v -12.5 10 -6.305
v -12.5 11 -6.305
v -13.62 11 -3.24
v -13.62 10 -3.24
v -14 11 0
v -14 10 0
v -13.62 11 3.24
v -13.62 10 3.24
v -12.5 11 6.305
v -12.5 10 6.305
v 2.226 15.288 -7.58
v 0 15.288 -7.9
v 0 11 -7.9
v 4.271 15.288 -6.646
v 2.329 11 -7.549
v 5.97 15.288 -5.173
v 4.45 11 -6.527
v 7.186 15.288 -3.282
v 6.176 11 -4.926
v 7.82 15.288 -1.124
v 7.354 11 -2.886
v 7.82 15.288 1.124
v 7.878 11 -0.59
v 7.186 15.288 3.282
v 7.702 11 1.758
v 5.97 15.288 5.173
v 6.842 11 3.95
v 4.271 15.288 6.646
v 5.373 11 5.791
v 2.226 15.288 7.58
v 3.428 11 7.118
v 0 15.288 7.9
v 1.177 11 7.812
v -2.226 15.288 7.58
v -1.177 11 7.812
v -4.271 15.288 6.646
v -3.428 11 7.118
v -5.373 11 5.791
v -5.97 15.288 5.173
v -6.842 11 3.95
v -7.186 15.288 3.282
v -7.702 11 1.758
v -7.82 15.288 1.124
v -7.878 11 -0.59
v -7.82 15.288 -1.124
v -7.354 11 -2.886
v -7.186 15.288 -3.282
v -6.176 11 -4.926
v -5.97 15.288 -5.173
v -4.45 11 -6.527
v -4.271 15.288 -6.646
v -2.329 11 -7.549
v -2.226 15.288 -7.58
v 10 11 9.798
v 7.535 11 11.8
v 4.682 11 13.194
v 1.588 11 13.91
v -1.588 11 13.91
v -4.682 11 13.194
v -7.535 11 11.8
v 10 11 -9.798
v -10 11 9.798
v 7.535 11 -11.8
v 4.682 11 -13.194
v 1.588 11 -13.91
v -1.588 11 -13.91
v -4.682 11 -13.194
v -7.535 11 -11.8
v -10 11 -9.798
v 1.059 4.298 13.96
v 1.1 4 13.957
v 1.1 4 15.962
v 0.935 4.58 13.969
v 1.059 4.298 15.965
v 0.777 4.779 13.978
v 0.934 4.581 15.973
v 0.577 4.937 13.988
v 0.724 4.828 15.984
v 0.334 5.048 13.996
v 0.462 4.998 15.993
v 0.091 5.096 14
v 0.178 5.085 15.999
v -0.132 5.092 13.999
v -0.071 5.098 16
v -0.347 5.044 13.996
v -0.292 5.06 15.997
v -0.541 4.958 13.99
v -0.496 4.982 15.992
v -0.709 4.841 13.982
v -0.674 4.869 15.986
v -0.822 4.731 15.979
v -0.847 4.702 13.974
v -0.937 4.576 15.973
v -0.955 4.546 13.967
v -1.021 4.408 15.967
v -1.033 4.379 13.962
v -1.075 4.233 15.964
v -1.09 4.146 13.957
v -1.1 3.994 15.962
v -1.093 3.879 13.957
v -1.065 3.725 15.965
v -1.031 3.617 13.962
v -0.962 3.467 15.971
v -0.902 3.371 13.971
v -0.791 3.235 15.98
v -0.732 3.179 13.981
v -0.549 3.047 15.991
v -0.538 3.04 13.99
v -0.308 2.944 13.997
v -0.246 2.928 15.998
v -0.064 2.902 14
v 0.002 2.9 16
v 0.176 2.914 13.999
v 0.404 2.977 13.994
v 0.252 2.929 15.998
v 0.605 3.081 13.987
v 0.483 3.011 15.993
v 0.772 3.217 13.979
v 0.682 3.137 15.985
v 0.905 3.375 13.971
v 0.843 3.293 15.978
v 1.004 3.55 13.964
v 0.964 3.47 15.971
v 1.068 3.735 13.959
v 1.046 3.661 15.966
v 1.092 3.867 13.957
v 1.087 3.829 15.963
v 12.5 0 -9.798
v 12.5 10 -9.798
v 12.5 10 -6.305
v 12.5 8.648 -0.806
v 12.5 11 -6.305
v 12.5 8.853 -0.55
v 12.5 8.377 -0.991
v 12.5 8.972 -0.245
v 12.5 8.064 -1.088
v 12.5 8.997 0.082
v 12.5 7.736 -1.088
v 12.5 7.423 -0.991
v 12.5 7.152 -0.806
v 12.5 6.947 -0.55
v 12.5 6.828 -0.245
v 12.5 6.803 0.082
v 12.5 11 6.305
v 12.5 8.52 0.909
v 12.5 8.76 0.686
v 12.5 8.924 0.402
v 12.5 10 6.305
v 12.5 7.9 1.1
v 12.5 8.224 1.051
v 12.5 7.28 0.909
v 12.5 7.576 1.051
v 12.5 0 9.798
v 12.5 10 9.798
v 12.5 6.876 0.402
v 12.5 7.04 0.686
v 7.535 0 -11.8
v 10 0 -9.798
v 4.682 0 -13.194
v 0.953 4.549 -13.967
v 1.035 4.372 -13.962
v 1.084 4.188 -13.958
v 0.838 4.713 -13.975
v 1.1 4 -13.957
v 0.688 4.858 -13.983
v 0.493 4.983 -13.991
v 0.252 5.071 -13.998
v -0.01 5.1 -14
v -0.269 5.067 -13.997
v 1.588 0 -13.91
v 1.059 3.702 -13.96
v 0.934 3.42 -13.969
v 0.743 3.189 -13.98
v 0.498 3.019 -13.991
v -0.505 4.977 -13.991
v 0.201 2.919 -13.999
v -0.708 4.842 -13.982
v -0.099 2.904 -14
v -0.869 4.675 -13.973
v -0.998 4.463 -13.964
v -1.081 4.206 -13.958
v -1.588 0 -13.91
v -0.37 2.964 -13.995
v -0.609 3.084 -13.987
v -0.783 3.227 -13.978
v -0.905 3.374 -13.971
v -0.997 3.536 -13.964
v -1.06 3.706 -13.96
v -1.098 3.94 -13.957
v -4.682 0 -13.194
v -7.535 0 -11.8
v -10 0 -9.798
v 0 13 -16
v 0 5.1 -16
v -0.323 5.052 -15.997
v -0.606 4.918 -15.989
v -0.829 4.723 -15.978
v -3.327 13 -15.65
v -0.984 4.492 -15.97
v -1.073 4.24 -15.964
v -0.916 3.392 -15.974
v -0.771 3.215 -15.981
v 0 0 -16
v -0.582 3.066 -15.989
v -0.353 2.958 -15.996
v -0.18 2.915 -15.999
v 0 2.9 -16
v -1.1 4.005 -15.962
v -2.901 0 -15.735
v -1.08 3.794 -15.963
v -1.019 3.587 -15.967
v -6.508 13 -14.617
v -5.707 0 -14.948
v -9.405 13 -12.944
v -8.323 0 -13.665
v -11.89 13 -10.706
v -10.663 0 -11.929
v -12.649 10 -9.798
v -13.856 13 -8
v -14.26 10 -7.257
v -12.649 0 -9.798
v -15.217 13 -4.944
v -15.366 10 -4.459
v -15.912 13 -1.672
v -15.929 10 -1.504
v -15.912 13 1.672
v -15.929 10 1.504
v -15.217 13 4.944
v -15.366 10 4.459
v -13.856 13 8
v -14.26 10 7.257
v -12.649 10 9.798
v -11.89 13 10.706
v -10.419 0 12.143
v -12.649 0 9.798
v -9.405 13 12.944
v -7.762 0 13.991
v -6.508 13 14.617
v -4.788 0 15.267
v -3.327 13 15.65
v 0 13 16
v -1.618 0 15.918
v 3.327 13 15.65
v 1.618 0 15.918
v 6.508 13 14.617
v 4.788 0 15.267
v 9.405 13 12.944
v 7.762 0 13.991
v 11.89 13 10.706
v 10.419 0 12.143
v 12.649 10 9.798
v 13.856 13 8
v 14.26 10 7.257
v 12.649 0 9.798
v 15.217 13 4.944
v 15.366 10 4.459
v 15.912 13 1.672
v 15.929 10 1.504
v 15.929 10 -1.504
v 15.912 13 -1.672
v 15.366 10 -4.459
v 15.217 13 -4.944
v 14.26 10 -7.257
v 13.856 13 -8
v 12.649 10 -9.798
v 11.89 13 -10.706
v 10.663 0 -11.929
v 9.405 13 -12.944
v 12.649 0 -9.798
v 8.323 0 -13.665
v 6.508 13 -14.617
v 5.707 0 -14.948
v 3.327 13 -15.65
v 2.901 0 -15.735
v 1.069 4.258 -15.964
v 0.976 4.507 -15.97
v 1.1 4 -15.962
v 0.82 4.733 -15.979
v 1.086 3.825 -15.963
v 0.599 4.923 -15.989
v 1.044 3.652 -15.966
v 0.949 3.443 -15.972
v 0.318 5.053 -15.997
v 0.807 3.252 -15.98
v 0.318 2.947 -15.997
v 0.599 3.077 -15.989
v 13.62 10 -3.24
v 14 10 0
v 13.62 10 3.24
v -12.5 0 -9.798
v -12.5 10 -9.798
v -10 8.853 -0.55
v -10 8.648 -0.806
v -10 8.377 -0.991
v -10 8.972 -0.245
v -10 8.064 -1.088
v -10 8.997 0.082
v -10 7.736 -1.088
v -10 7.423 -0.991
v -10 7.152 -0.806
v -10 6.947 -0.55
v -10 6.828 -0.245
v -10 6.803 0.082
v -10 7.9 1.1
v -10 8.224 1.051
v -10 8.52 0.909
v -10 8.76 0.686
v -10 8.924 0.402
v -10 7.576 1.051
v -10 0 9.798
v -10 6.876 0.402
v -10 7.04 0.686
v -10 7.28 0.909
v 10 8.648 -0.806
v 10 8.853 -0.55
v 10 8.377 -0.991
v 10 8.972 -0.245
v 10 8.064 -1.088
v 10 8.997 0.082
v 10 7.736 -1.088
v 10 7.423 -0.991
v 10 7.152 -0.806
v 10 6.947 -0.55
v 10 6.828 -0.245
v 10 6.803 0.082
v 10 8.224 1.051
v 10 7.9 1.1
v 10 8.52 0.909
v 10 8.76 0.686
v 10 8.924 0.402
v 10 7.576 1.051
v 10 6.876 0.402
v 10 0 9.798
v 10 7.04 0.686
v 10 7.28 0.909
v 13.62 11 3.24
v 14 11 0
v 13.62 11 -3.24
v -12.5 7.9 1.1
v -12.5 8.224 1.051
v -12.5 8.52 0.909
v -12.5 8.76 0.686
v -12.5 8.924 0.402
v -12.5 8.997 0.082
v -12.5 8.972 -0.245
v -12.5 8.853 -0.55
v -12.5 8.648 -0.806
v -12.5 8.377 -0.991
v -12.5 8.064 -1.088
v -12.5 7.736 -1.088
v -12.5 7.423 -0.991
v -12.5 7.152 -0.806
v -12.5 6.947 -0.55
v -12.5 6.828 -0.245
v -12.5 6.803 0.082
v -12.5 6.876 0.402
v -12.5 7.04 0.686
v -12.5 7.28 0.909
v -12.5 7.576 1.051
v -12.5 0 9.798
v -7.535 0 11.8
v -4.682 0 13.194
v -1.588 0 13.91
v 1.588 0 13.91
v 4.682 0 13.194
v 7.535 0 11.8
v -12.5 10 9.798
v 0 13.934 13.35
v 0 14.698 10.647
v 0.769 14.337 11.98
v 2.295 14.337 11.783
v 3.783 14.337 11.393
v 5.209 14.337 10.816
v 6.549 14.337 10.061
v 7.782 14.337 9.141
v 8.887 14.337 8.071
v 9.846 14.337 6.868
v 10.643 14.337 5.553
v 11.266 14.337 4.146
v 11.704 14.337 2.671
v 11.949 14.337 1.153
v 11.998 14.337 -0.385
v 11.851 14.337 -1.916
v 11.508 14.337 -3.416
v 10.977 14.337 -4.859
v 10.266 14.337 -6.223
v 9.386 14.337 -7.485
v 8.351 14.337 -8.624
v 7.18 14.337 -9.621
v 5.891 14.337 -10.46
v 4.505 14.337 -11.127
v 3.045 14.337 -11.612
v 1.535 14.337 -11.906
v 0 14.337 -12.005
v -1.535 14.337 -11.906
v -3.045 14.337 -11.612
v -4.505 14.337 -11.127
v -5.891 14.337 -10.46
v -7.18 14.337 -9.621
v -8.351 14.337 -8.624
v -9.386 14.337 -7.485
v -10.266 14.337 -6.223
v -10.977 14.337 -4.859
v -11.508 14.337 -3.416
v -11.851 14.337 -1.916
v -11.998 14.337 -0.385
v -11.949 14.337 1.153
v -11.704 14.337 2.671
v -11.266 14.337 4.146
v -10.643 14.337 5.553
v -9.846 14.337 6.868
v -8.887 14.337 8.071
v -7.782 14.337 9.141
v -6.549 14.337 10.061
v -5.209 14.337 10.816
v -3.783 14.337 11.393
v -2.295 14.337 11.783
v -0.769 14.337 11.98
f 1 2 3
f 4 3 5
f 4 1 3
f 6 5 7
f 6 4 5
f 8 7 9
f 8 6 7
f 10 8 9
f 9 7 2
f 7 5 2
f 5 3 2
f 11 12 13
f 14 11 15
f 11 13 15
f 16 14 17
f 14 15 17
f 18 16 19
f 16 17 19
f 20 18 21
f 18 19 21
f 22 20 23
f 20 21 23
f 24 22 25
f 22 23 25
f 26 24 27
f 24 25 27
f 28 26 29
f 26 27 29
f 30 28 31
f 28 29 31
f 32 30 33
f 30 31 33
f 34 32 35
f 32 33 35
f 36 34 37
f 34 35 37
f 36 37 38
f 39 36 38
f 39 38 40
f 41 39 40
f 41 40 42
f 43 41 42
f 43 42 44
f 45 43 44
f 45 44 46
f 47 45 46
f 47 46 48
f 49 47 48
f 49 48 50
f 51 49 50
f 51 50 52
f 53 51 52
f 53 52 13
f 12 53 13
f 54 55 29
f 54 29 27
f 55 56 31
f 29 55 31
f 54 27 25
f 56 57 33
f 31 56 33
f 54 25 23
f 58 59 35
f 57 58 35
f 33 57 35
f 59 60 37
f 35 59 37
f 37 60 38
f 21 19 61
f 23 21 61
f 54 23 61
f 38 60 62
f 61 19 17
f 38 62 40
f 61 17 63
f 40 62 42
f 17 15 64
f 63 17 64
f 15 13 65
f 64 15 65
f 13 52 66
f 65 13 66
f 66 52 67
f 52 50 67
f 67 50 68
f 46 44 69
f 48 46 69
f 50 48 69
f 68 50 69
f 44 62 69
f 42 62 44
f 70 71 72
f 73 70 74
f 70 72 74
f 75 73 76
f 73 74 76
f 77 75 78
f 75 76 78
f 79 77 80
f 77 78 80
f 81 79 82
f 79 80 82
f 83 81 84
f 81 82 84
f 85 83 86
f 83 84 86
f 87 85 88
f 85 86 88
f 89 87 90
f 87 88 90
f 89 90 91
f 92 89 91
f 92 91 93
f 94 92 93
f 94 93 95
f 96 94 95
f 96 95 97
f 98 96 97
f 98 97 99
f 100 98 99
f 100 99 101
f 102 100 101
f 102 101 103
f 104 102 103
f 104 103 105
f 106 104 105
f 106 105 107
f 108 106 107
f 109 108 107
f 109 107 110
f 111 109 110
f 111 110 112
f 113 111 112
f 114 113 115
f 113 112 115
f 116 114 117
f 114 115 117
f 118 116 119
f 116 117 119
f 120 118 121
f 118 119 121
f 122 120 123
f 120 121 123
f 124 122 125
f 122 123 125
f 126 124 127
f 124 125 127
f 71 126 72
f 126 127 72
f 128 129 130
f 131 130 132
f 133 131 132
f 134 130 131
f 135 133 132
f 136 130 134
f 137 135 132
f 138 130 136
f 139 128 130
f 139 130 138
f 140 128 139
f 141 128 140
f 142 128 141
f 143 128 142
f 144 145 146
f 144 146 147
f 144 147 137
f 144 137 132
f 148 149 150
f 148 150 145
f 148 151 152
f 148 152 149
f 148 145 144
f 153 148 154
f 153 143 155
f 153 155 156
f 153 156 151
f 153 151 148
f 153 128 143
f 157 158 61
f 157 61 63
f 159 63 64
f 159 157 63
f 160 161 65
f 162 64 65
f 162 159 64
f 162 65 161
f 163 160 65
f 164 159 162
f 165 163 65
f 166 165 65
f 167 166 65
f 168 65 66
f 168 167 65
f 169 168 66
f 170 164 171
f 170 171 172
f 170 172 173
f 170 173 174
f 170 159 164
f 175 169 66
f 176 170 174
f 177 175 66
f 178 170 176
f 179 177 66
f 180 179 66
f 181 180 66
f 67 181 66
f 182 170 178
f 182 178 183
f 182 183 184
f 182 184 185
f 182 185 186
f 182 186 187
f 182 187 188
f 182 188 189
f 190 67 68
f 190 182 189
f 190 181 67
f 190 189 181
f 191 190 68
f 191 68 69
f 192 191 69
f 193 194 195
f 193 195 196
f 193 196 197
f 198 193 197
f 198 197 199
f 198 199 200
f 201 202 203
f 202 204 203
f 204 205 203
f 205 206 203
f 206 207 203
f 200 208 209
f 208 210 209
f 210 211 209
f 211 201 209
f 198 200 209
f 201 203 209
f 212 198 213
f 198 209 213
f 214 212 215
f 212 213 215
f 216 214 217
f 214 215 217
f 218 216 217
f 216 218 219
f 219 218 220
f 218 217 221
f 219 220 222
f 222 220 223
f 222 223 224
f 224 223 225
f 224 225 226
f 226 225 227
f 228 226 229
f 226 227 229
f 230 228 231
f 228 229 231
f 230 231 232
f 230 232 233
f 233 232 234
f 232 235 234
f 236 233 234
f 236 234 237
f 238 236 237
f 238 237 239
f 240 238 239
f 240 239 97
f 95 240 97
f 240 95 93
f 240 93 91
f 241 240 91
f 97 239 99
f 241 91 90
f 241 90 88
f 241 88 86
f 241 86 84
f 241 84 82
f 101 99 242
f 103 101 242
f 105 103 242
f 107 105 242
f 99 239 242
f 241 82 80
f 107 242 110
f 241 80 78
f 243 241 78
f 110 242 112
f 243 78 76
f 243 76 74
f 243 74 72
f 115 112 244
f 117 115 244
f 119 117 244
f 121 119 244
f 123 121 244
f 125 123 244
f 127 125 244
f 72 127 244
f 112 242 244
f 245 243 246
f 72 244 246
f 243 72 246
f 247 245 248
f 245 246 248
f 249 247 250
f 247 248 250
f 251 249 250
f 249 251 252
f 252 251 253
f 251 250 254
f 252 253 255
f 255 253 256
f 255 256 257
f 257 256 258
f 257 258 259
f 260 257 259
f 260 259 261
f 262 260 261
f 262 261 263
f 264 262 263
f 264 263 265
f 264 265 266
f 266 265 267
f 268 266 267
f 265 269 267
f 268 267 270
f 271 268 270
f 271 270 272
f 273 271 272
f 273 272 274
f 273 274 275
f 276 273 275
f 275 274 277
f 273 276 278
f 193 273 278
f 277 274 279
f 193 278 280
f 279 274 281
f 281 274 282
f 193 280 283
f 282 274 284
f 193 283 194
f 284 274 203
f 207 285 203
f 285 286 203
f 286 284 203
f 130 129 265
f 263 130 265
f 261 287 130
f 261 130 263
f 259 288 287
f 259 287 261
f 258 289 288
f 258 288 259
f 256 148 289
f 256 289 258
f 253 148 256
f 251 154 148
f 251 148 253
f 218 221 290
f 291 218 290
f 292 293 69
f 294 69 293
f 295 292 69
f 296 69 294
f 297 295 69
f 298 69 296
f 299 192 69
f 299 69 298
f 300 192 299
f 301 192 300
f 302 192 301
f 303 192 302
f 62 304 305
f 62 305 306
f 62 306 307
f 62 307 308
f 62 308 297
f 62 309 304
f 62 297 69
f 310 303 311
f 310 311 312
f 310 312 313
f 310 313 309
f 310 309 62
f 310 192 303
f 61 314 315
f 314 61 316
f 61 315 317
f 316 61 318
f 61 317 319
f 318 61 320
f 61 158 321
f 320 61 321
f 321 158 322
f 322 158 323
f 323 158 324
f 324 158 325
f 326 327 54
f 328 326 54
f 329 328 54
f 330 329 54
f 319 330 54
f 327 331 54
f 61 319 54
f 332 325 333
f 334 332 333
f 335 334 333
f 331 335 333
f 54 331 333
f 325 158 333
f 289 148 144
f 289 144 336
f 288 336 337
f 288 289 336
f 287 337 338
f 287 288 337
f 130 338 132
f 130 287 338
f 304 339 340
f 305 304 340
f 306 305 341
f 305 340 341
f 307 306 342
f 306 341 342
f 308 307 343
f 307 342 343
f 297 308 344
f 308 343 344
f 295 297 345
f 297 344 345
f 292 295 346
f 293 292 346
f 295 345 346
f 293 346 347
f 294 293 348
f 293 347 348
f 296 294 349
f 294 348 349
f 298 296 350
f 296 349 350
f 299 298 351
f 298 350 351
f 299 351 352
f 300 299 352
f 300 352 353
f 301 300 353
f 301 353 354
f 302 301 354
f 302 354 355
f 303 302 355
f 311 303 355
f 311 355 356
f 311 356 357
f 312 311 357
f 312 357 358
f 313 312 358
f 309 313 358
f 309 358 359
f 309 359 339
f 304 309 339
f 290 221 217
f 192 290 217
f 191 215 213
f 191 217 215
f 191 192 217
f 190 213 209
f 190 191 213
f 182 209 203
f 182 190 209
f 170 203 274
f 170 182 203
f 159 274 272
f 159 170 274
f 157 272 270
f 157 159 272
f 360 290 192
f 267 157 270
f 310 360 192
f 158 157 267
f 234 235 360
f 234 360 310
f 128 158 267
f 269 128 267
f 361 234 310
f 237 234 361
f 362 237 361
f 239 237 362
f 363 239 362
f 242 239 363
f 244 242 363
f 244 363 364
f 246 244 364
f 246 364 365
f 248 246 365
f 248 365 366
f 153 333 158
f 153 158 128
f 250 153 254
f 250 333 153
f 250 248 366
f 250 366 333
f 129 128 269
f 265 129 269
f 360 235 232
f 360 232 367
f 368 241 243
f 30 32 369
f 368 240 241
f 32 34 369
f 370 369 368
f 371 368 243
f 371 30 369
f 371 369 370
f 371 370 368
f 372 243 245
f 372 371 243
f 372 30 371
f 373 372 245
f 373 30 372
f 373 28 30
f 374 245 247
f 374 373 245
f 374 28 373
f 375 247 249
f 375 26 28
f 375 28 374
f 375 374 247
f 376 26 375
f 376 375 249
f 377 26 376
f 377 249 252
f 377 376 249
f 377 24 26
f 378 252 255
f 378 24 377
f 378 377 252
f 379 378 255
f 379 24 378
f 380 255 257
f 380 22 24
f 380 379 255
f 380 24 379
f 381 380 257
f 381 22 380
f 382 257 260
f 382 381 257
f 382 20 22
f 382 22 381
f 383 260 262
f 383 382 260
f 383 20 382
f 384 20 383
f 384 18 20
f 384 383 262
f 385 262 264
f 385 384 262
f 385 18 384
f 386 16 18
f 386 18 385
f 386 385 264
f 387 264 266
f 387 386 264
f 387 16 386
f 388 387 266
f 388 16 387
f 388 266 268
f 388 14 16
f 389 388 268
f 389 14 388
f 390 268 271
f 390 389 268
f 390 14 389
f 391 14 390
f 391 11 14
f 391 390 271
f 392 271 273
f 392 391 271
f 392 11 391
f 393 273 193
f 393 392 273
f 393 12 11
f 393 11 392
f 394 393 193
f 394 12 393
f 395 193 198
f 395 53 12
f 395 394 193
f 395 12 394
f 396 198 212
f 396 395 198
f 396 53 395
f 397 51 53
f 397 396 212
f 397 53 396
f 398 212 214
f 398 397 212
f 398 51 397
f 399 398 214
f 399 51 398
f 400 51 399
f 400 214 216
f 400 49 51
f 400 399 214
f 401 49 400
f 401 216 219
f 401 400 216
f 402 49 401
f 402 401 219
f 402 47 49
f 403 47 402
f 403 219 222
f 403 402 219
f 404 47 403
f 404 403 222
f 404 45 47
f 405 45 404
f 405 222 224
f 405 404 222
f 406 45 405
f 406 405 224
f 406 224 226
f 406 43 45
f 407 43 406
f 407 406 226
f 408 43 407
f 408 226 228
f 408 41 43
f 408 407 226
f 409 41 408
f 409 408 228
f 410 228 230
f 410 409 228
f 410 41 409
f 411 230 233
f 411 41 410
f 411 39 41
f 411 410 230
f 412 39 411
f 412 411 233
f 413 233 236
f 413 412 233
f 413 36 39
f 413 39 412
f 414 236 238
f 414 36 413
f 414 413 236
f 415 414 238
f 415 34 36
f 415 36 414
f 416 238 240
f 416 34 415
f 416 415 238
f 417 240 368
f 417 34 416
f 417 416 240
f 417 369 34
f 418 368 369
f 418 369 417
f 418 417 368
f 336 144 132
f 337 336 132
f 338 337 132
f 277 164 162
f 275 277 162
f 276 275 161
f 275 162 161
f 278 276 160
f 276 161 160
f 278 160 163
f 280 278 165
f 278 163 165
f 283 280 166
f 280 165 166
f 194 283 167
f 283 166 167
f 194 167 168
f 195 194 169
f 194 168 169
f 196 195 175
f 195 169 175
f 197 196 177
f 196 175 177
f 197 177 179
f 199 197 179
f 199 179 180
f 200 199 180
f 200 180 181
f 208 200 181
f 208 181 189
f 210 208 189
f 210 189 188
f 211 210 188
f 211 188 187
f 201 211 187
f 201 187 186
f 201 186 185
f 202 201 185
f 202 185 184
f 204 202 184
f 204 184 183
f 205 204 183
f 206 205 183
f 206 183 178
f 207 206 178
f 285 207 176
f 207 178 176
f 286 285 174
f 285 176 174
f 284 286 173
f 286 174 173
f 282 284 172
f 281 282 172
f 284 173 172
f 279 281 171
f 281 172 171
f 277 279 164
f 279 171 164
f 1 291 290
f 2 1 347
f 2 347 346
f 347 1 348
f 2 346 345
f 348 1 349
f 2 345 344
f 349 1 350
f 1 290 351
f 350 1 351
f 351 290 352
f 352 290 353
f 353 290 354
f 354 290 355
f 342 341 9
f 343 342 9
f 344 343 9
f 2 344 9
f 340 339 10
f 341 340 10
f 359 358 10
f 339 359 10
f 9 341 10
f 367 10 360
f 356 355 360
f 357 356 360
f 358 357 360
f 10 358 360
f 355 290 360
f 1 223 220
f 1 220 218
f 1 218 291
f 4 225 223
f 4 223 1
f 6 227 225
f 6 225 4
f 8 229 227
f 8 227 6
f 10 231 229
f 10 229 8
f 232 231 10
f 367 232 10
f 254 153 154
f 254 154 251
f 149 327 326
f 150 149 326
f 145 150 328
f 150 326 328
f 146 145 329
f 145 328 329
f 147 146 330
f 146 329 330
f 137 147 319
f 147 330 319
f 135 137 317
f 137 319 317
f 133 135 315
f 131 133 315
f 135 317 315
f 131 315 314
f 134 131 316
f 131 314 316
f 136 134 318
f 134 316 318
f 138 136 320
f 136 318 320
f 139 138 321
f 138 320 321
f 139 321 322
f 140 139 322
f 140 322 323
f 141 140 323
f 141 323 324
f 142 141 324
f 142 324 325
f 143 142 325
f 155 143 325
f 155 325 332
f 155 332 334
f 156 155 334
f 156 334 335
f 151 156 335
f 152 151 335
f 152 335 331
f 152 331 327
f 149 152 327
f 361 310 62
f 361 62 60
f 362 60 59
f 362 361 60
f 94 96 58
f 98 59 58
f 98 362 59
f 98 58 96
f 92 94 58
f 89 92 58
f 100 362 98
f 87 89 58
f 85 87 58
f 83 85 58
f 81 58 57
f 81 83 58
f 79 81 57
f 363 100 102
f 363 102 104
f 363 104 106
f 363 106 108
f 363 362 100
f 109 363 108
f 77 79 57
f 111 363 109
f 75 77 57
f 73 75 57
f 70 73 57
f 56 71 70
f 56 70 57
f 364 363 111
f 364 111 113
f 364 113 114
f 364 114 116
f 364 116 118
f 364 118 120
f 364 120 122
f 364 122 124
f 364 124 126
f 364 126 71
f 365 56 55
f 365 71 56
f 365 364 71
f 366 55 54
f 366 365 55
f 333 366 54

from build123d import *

# Parameters (mm, degrees)
CROQUIS1_R              = 16
SALIENTE_EXTRUIR1_DEPTH = 13
VACIADO1_T              = -2
CROQUIS2_W              = 7.778512226
CROQUIS2_H              = 19.595917942
CROQUIS2_W_2            = 8.965433382
CORTAR_EXTRUIR1_DEPTH   = 10
SALIENTE_EXTRUIR2_REACH = 28.096
CROQUIS3_W              = 2.5
CROQUIS3_H              = 19.595917942
CROQUIS4_R              = 1.1
CORTAR_EXTRUIR2_DEPTH   = 36.174564674
CROQUIS5_R              = 1.1
CORTAR_EXTRUIR3_DEPTH   = 47.786750261
C_PULA1_FACE_RADIUS     = 16
C_PULA1_HEIGHT          = 3
CROQUIS7_R              = 7.9
CORTAR_EXTRUIR4_DEPTH   = 10


with BuildPart() as part:
    # Croquis1 → Saliente-Extruir1 (new body)
    with BuildSketch(Plane(origin=(0, 0, 0), x_dir=(1, 0, 0), z_dir=(0, 1, 0))):
        with Locations(Location((0, 0, 0), (0, 0, 90))):
            Circle(CROQUIS1_R)
    extrude(amount=SALIENTE_EXTRUIR1_DEPTH)

    # Vaciado1
    vaciado1_openings = [part.faces().sort_by_distance(p)[0] for p in [
        (0, 0, 0),
    ]]
    offset(amount=VACIADO1_T, openings=vaciado1_openings, kind=Kind.INTERSECTION)

    # Croquis2 → Cortar-Extruir1 (cut)
    with BuildSketch(Plane.XZ):
        with Locations((13.889256113, 0)):
            Rectangle(CROQUIS2_W, CROQUIS2_H)
        with Locations((-14.482716691, 0)):
            Rectangle(CROQUIS2_W_2, CROQUIS2_H)
    extrude(amount=-CORTAR_EXTRUIR1_DEPTH, mode=Mode.SUBTRACT)

    # Croquis3 → Saliente-Extruir2 (add, up to next)
    with BuildSketch(Plane.XZ, mode=Mode.PRIVATE) as saliente_extruir2_sk1:
        with Locations((-11.25, 0)):
            Rectangle(CROQUIS3_W, CROQUIS3_H)
    saliente_extruir2_tool1 = extrude(saliente_extruir2_sk1.sketch, amount=-SALIENTE_EXTRUIR2_REACH, mode=Mode.PRIVATE) - part.part
    # Croquis3 → Saliente-Extruir2 (add, up to next)
    with BuildSketch(Plane.XZ, mode=Mode.PRIVATE) as saliente_extruir2_sk2:
        with Locations((11.25, 0)):
            Rectangle(CROQUIS3_W, CROQUIS3_H)
    saliente_extruir2_tool2 = extrude(saliente_extruir2_sk2.sketch, amount=-SALIENTE_EXTRUIR2_REACH, mode=Mode.PRIVATE) - part.part
    add(saliente_extruir2_tool1.solids().sort_by_distance((-11.25, 0, 0))[0])
    add(saliente_extruir2_tool2.solids().sort_by_distance((11.25, 0, 0))[0])

    # Croquis4 → Cortar-Extruir2 (cut, through all)
    with BuildSketch(Plane.ZY.offset(12.5)):
        with Locations((0, 7.9)):
            Circle(CROQUIS4_R)
    extrude(amount=-CORTAR_EXTRUIR2_DEPTH, mode=Mode.SUBTRACT)

    # Croquis5 → Cortar-Extruir3 (cut, through all)
    with BuildSketch(Plane.XY.offset(26)):
        with Locations((0, 4)):
            Circle(CROQUIS5_R)
    extrude(amount=-CORTAR_EXTRUIR3_DEPTH, mode=Mode.SUBTRACT)

    # Cúpula1: a dome of height H over a round flat face of radius A is a cap of a sphere of radius (A * A + H * H) / (2 * H)
    c_pula1_r = (C_PULA1_FACE_RADIUS * C_PULA1_FACE_RADIUS + C_PULA1_HEIGHT * C_PULA1_HEIGHT) / (2 * C_PULA1_HEIGHT)
    c_pula1_base = Plane((0, 13, 0), z_dir=(0, 1, 0))
    with Locations(c_pula1_base.offset(C_PULA1_HEIGHT - c_pula1_r)):
        c_pula1_ball = Sphere(c_pula1_r, mode=Mode.PRIVATE)
    add(split(c_pula1_ball, bisect_by=c_pula1_base, keep=Keep.TOP, mode=Mode.PRIVATE))

    # Croquis7 → Cortar-Extruir4 (cut)
    with BuildSketch(Plane.XZ.offset(-11)):
        with Locations(Location((0, 0, 0), (0, 0, 270))):
            Circle(CROQUIS7_R)
    extrude(amount=-CORTAR_EXTRUIR4_DEPTH, mode=Mode.SUBTRACT)


solid = part.part
